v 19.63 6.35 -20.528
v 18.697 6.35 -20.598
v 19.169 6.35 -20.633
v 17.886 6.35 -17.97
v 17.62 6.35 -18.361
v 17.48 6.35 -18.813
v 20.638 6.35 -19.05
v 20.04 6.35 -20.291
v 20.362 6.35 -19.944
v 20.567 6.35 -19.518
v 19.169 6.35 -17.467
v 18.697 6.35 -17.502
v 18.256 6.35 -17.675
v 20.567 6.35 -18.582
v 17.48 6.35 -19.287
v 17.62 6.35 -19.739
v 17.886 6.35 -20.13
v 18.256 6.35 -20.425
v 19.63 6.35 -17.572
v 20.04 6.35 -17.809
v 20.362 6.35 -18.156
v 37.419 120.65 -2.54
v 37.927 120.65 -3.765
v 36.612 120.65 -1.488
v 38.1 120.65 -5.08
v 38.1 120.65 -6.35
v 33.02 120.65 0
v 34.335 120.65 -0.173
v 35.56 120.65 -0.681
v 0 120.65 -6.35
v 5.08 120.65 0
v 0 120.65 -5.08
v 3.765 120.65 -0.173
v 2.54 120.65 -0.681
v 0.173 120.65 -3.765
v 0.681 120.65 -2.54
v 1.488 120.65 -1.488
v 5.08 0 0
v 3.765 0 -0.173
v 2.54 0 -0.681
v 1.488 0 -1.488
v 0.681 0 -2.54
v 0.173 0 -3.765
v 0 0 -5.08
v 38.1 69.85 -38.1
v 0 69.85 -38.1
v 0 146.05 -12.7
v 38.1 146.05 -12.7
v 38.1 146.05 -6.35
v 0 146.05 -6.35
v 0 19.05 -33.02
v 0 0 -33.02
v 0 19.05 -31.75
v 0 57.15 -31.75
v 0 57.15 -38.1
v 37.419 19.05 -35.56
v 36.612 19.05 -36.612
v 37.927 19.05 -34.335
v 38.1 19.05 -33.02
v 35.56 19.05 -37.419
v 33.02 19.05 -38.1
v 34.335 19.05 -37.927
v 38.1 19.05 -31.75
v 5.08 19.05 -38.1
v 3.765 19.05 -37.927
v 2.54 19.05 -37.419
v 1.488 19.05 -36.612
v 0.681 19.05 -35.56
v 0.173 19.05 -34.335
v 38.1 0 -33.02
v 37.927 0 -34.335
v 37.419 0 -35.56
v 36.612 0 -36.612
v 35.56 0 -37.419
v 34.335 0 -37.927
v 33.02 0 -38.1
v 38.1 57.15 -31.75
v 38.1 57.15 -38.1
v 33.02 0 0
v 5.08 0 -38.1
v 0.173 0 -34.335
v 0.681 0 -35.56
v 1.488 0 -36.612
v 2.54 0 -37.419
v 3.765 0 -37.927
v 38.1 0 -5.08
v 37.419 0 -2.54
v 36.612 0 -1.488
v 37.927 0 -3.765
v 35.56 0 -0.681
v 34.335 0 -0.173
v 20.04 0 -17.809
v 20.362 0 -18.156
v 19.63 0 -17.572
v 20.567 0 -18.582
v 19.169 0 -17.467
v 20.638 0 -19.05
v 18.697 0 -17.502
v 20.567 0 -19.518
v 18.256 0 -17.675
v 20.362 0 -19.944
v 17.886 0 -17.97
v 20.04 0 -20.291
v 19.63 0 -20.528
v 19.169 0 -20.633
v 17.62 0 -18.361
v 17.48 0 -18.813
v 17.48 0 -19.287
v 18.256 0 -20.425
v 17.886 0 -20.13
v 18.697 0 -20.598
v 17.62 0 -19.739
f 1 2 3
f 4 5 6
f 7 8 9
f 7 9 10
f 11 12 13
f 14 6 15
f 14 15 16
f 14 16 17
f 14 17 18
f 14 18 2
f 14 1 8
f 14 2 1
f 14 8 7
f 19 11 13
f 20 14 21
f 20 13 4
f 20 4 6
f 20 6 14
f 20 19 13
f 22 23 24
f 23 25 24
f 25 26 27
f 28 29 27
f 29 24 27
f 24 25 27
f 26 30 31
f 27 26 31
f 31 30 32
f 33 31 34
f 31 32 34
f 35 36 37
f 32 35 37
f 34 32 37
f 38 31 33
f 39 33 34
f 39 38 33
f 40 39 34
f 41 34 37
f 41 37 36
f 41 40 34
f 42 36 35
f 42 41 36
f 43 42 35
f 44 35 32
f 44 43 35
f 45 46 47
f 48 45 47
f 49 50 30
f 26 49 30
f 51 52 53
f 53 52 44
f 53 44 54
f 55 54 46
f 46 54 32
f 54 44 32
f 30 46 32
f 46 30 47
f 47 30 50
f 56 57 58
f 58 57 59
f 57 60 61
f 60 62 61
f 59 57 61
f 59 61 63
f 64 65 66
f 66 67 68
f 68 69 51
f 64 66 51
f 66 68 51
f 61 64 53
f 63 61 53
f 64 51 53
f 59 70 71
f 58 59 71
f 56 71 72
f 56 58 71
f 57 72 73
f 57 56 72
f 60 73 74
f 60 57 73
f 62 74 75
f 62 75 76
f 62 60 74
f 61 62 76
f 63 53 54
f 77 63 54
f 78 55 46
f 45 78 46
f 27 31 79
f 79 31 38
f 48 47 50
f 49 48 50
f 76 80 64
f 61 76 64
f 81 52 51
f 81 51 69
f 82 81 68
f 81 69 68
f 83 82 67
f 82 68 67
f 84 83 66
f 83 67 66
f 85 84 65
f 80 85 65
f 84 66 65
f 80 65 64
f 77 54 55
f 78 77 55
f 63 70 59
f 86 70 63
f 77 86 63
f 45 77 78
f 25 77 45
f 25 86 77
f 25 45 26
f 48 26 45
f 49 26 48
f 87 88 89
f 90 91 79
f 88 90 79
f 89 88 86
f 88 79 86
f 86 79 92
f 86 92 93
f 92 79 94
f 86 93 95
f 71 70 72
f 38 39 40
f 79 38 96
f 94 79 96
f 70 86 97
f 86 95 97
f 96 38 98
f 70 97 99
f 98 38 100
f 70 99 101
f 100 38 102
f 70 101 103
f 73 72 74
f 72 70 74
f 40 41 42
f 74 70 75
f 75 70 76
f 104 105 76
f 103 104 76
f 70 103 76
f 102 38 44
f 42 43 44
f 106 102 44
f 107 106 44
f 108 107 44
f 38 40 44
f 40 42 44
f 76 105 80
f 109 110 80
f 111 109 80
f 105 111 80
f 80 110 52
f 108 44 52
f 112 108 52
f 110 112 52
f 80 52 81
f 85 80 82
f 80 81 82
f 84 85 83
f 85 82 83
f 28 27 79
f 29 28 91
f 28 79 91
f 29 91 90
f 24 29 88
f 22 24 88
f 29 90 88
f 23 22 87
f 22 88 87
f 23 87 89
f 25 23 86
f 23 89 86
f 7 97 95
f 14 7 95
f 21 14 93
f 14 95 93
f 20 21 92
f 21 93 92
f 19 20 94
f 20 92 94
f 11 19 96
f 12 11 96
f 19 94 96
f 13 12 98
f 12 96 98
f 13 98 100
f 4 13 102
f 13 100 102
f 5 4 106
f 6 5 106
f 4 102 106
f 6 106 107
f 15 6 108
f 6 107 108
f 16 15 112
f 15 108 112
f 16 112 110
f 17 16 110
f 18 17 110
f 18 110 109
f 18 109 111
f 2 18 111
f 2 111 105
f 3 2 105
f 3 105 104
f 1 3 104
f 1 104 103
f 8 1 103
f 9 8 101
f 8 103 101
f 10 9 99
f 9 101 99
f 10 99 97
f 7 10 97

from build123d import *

# Parameters (mm, degrees)
F1_DEPTH = 38.1
F2_R     = 1.5875
F3_DEPTH = 6.35
F4_R     = 5.08


with BuildPart() as f1:
    # F0 (on Right) → F1 (new body)
    with BuildSketch(Plane.YZ):
        Polygon((120.65, 0), (0, 0), (0, -38.1), (19.05, -38.1), (19.05, -31.75), (57.15, -31.75), (57.15, -38.1), (69.85, -38.1), (146.05, -12.7), (146.05, -6.35), (120.65, -6.35), align=None)
    extrude(amount=F1_DEPTH)

    # F2 (on face) → F3 (cut)
    with BuildSketch(Plane.XZ):
        with Locations((19.05, -19.05)):
            Circle(F2_R)
    extrude(amount=-F3_DEPTH, mode=Mode.SUBTRACT)

    # F4
    f4_edges = [f1.edges().sort_by_distance(p)[0] for p in [
        (38.1, 60.325, 0),
        (0, 60.325, 0),
        (38.1, 9.525, -38.1),
        (0, 9.525, -38.1),
    ]]
    fillet(f4_edges, radius=F4_R)


solid = f1.part
